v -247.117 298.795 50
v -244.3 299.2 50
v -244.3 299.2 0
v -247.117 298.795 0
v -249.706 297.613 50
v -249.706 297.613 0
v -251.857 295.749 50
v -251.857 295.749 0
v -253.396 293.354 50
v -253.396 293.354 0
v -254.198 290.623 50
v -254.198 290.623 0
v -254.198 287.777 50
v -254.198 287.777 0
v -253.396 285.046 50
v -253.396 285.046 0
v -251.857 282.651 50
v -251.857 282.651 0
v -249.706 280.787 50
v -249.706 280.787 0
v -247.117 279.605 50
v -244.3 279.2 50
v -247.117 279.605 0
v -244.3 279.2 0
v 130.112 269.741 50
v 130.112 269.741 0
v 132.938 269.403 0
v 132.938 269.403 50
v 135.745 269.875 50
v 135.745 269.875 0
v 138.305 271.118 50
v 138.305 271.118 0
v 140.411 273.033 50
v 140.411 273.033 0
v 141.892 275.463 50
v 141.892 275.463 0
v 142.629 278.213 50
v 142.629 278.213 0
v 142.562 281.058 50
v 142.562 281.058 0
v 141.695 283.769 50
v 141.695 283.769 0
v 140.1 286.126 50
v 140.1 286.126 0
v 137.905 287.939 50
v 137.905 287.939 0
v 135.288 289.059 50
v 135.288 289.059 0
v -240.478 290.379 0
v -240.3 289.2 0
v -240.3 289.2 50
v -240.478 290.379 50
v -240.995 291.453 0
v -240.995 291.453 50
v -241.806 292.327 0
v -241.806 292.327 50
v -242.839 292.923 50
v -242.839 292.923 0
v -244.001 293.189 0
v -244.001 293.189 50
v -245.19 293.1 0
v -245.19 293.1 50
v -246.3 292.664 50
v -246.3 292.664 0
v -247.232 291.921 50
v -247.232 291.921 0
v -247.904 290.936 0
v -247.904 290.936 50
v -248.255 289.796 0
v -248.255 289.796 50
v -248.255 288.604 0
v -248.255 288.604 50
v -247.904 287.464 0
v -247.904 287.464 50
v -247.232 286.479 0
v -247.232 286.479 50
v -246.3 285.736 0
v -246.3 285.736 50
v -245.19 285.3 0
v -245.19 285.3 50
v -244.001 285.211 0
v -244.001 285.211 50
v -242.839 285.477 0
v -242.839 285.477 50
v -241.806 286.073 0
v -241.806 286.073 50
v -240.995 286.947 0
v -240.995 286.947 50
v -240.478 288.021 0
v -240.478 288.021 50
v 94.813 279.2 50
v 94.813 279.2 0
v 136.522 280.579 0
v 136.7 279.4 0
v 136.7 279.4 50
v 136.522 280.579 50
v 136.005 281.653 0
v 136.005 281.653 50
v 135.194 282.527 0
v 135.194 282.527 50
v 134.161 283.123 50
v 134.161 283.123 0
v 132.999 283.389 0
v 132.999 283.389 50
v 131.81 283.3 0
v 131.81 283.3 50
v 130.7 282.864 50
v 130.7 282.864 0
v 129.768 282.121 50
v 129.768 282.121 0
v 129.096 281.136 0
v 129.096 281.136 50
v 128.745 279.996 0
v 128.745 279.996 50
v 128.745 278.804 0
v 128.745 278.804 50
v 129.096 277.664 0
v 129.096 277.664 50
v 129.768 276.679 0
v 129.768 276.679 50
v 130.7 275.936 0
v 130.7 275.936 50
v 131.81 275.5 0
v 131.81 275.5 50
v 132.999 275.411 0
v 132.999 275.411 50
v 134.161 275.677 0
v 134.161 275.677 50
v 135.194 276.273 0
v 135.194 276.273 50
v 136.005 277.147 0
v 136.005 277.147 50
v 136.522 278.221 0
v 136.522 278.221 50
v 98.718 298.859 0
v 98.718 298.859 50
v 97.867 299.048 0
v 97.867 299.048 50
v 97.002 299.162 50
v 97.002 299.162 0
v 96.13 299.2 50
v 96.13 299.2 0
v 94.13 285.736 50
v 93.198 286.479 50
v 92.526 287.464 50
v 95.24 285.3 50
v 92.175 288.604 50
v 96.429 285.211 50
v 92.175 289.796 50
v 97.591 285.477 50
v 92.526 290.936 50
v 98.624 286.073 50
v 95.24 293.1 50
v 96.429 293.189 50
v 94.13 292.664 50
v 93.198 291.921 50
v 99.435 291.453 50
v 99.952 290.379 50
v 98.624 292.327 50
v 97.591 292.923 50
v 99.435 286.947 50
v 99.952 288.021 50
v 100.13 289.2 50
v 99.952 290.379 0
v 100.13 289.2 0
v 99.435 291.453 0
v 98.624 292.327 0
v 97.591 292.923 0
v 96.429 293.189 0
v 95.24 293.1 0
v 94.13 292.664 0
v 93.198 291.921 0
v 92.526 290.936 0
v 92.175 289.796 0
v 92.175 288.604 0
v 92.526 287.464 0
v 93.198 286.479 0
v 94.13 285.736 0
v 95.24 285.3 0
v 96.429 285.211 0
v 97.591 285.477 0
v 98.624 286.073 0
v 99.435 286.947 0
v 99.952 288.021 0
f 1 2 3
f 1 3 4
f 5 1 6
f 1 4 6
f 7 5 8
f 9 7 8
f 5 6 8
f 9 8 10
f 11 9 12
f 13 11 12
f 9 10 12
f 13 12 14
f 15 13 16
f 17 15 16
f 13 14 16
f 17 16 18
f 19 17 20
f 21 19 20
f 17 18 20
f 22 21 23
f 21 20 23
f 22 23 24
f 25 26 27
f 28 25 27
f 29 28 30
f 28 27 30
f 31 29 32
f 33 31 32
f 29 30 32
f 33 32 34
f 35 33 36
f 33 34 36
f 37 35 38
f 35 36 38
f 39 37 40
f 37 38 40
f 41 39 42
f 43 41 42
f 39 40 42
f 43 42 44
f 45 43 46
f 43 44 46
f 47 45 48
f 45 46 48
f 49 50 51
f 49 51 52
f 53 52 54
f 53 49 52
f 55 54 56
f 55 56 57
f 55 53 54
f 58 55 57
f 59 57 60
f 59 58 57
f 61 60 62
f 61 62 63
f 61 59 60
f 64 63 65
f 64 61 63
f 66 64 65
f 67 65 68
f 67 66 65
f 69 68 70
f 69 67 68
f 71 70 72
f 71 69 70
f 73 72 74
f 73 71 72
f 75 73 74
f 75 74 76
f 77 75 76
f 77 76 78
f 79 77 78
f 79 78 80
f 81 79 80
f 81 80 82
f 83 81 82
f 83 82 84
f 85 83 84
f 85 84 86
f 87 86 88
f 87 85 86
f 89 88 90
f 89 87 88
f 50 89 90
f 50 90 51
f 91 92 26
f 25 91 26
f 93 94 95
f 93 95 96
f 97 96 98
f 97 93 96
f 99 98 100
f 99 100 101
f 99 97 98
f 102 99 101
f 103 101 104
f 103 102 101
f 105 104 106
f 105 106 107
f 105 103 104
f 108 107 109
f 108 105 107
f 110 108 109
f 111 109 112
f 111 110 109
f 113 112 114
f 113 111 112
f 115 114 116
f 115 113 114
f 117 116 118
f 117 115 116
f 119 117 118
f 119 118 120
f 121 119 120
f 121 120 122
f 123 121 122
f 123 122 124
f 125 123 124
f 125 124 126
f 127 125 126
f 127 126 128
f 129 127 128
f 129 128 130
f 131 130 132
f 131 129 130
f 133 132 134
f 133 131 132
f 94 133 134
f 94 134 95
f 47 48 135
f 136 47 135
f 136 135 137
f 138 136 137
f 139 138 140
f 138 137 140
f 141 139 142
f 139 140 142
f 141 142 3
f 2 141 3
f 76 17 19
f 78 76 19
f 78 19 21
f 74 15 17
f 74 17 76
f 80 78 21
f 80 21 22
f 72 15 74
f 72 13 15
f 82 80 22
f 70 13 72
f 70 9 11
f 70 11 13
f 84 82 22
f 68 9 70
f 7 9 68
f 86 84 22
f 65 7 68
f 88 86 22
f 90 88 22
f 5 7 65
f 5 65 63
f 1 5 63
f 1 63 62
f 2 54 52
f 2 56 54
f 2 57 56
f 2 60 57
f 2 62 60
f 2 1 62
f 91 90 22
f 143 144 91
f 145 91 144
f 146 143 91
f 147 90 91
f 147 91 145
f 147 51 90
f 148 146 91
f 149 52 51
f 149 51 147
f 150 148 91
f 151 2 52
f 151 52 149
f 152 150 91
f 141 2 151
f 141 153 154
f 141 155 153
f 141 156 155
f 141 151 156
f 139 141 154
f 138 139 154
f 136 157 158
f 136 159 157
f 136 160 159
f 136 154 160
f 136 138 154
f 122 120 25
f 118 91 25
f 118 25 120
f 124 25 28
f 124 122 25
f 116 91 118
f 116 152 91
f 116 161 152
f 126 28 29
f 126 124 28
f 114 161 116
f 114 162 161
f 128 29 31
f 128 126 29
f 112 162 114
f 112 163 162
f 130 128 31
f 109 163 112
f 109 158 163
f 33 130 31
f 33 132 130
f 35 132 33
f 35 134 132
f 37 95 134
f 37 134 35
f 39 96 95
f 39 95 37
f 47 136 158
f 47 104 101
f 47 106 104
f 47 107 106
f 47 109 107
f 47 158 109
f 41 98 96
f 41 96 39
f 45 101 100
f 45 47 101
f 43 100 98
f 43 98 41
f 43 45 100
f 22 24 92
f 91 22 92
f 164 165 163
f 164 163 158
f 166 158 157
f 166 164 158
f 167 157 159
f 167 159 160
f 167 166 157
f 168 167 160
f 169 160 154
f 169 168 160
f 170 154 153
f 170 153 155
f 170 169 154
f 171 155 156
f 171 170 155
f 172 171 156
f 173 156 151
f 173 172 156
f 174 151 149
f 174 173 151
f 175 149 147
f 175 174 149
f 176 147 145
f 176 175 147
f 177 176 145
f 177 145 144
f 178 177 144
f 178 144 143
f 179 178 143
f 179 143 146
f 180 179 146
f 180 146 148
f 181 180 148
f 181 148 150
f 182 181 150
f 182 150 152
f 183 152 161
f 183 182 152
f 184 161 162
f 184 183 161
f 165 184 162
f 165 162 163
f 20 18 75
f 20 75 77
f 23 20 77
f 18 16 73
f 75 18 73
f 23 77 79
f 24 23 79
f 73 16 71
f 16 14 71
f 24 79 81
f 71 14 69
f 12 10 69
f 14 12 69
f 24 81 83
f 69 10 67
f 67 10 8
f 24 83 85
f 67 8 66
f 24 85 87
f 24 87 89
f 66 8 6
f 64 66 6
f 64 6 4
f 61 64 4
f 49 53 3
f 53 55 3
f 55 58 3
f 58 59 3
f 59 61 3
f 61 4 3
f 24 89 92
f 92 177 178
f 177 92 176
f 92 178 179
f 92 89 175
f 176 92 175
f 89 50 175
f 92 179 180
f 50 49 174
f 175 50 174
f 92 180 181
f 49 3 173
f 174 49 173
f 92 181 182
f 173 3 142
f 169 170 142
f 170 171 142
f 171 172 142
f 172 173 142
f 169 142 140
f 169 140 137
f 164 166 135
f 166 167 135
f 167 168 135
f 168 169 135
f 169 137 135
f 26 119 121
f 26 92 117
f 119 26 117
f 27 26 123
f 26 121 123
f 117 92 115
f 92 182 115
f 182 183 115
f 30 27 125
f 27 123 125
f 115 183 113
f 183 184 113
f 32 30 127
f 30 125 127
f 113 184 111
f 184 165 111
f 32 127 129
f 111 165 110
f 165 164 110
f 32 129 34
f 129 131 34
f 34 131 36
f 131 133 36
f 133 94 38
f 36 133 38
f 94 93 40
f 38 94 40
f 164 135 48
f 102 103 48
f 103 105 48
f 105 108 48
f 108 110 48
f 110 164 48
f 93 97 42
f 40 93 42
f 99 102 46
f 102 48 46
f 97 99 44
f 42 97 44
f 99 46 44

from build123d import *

# Parameters (mm, degrees)
SKETCH1_R           = 4
BOSS_EXTRUDE1_DEPTH = 50


with BuildPart() as part:
    # Sketch1 → Boss-Extrude1 (new body)
    with BuildSketch(Plane.XY):
        with BuildLine():
            Line((94.813332526, 279.2), (130.111538956, 269.740814246))
            ThreePointArc((130.111538956, 269.740814246), (142.359185754, 276.811538956), (135.288461044, 289.059185754))
            Line((135.288461044, 289.059185754), (98.718461044, 298.859185754))
            ThreePointArc((98.718461044, 298.859185754), (97.435400794, 299.11443033), (96.13, 299.2))
            Line((96.13, 299.2), (-244.3, 299.2))
            ThreePointArc((-244.3, 299.2), (-254.3, 289.2), (-244.3, 279.2))
            Line((-244.3, 279.2), (94.813332526, 279.2))
        make_face()
        with Locations((96.13, 289.2)):
            Circle(SKETCH1_R, mode=Mode.SUBTRACT)
        with Locations((132.7, 279.4)):
            Circle(SKETCH1_R, mode=Mode.SUBTRACT)
        with Locations((-244.3, 289.2)):
            Circle(SKETCH1_R, mode=Mode.SUBTRACT)
    extrude(amount=BOSS_EXTRUDE1_DEPTH)


solid = part.part
